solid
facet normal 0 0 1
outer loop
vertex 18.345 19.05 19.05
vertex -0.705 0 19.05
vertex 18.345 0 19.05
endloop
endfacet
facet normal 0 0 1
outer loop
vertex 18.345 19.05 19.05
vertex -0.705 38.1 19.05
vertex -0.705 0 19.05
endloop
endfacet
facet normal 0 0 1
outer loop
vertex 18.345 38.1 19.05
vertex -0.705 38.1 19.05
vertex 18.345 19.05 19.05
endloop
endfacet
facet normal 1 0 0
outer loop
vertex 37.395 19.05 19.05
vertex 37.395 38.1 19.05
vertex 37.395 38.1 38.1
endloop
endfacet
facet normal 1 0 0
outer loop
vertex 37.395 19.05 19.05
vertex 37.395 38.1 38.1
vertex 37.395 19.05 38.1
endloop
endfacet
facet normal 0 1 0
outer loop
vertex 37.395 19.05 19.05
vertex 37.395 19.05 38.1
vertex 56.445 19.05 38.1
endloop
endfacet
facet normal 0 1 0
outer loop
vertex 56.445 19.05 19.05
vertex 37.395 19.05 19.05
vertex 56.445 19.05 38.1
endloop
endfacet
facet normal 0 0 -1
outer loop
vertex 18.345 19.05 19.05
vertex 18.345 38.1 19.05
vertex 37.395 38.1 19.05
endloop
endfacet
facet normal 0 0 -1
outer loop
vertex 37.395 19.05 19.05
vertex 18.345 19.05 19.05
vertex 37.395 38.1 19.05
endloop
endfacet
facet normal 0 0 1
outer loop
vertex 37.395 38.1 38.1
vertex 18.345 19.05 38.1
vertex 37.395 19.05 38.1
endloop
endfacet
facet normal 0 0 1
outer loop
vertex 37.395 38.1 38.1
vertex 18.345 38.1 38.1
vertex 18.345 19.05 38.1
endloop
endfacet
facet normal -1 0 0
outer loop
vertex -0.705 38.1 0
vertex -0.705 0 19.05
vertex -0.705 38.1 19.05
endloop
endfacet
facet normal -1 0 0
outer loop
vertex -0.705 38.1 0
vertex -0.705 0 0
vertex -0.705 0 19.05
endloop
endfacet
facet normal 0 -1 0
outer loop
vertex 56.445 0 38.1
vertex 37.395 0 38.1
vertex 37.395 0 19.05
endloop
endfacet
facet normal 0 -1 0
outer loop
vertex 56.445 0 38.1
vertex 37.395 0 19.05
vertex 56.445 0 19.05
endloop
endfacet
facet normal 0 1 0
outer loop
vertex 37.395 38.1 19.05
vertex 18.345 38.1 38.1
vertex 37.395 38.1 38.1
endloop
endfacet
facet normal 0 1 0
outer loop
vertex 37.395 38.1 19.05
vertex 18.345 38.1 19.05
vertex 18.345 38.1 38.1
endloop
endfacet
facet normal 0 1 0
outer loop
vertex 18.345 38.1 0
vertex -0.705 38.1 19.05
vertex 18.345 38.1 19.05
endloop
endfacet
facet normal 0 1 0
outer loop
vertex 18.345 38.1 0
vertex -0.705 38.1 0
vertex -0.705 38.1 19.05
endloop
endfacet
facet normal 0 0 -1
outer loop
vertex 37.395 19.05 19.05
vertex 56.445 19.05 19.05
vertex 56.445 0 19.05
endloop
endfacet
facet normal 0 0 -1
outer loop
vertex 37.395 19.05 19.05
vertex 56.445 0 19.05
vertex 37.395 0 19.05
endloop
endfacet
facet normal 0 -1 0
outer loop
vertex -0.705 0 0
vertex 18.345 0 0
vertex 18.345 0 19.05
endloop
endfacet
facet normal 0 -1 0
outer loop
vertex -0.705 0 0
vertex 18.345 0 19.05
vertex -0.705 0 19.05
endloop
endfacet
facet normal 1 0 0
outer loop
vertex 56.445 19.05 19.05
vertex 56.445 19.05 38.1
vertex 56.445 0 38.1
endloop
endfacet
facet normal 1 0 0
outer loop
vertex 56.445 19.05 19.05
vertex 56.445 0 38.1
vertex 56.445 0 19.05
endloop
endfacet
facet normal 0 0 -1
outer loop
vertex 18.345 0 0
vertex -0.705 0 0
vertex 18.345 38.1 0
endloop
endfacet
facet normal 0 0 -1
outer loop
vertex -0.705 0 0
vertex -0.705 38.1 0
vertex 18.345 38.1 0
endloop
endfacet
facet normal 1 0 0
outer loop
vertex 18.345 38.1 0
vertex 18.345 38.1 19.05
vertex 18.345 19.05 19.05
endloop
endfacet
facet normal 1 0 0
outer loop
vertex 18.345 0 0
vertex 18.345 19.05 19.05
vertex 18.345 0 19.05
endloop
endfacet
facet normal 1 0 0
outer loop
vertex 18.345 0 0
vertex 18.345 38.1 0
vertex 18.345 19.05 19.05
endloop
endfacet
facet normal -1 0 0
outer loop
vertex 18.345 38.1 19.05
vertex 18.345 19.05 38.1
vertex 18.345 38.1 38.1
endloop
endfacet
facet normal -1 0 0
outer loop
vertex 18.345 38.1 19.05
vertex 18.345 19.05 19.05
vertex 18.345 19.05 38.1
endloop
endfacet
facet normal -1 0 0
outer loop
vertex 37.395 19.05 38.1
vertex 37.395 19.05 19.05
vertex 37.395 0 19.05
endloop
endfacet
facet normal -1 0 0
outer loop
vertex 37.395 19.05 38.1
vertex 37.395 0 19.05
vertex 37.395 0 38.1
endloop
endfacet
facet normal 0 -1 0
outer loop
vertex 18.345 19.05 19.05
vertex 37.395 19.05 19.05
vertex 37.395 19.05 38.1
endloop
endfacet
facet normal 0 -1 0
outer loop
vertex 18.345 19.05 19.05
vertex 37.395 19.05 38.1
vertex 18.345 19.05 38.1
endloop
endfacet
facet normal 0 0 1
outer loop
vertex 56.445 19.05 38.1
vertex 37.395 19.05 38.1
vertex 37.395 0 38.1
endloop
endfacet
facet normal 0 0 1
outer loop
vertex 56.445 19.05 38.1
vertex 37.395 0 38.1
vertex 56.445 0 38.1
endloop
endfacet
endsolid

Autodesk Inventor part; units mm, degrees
ref_plane "YZ Plane" through (0, 0, 0) normal (1, 0, 0) x (0, 1, 0)
ref_plane "XZ Plane" through (0, 0, 0) normal (0, 1, 0) x (-1, 0, 0)
ref_plane "XY Plane" through (0, 0, 0) normal (0, 0, 1) x (1, 0, 0)
sketch "Sketch1" plane through (0, 0, 0) normal (0, 0, 1) x (1, 0, 0)
  line L0 (-0.7054, 38.1) -> (18.3446, 38.1)
  line L1 (18.3446, 38.1) -> (18.3446, 0)
  line L2 (18.3446, 0) -> (-0.7054, 0)
  line L3 (-0.7054, 0) -> (-0.7054, 38.1)
  point P0 (0, 0)
  dimension "d0" = 38.1
  dimension "d1" = 19.05
extrude "Extrusion1" add sketch "Sketch1" along normal blind 19.05
sketch "Sketch2" plane through (0, 0, 19.05) normal (0, 0, 1) x (1, 0, 0)
  line L0 (18.3446, 0) -> (18.3446, 38.1) projected
  line L1 (18.3446, 38.1) -> (37.3946, 38.1)
  line L2 (37.3946, 38.1) -> (37.3946, 19.05)
  line L3 (37.3946, 19.05) -> (18.3446, 19.05)
  line L4 (18.3446, 19.05) -> (18.3446, 38.1)
  point P0 (0, 0)
  dimension "d4" = 19.05
  dimension "d5" = 19.05
extrude "Extrusion2" add sketch "Sketch2" along normal blind 19.05
sketch "Sketch3" plane through (18.3446, 19.05, 19.05) normal (0, -1, 0) x (1, 0, 0)
  line L0 (19.05, 0) -> (19.05, 19.05) projected
  line L1 (19.05, 19.05) -> (38.1, 19.05)
  line L2 (38.1, 19.05) -> (38.1, 0)
  line L3 (38.1, 0) -> (19.05, 0)
  line L4 (19.05, 0) -> (19.05, 19.05)
  point P0 (-18.3446, -19.05)
  dimension "d8" = 19.05
  dimension "d9" = 19.05
extrude "Extrusion3" add sketch "Sketch3" along normal blind 19.05
properties part number "Light Blue Part" material "Wood (Maple)"
